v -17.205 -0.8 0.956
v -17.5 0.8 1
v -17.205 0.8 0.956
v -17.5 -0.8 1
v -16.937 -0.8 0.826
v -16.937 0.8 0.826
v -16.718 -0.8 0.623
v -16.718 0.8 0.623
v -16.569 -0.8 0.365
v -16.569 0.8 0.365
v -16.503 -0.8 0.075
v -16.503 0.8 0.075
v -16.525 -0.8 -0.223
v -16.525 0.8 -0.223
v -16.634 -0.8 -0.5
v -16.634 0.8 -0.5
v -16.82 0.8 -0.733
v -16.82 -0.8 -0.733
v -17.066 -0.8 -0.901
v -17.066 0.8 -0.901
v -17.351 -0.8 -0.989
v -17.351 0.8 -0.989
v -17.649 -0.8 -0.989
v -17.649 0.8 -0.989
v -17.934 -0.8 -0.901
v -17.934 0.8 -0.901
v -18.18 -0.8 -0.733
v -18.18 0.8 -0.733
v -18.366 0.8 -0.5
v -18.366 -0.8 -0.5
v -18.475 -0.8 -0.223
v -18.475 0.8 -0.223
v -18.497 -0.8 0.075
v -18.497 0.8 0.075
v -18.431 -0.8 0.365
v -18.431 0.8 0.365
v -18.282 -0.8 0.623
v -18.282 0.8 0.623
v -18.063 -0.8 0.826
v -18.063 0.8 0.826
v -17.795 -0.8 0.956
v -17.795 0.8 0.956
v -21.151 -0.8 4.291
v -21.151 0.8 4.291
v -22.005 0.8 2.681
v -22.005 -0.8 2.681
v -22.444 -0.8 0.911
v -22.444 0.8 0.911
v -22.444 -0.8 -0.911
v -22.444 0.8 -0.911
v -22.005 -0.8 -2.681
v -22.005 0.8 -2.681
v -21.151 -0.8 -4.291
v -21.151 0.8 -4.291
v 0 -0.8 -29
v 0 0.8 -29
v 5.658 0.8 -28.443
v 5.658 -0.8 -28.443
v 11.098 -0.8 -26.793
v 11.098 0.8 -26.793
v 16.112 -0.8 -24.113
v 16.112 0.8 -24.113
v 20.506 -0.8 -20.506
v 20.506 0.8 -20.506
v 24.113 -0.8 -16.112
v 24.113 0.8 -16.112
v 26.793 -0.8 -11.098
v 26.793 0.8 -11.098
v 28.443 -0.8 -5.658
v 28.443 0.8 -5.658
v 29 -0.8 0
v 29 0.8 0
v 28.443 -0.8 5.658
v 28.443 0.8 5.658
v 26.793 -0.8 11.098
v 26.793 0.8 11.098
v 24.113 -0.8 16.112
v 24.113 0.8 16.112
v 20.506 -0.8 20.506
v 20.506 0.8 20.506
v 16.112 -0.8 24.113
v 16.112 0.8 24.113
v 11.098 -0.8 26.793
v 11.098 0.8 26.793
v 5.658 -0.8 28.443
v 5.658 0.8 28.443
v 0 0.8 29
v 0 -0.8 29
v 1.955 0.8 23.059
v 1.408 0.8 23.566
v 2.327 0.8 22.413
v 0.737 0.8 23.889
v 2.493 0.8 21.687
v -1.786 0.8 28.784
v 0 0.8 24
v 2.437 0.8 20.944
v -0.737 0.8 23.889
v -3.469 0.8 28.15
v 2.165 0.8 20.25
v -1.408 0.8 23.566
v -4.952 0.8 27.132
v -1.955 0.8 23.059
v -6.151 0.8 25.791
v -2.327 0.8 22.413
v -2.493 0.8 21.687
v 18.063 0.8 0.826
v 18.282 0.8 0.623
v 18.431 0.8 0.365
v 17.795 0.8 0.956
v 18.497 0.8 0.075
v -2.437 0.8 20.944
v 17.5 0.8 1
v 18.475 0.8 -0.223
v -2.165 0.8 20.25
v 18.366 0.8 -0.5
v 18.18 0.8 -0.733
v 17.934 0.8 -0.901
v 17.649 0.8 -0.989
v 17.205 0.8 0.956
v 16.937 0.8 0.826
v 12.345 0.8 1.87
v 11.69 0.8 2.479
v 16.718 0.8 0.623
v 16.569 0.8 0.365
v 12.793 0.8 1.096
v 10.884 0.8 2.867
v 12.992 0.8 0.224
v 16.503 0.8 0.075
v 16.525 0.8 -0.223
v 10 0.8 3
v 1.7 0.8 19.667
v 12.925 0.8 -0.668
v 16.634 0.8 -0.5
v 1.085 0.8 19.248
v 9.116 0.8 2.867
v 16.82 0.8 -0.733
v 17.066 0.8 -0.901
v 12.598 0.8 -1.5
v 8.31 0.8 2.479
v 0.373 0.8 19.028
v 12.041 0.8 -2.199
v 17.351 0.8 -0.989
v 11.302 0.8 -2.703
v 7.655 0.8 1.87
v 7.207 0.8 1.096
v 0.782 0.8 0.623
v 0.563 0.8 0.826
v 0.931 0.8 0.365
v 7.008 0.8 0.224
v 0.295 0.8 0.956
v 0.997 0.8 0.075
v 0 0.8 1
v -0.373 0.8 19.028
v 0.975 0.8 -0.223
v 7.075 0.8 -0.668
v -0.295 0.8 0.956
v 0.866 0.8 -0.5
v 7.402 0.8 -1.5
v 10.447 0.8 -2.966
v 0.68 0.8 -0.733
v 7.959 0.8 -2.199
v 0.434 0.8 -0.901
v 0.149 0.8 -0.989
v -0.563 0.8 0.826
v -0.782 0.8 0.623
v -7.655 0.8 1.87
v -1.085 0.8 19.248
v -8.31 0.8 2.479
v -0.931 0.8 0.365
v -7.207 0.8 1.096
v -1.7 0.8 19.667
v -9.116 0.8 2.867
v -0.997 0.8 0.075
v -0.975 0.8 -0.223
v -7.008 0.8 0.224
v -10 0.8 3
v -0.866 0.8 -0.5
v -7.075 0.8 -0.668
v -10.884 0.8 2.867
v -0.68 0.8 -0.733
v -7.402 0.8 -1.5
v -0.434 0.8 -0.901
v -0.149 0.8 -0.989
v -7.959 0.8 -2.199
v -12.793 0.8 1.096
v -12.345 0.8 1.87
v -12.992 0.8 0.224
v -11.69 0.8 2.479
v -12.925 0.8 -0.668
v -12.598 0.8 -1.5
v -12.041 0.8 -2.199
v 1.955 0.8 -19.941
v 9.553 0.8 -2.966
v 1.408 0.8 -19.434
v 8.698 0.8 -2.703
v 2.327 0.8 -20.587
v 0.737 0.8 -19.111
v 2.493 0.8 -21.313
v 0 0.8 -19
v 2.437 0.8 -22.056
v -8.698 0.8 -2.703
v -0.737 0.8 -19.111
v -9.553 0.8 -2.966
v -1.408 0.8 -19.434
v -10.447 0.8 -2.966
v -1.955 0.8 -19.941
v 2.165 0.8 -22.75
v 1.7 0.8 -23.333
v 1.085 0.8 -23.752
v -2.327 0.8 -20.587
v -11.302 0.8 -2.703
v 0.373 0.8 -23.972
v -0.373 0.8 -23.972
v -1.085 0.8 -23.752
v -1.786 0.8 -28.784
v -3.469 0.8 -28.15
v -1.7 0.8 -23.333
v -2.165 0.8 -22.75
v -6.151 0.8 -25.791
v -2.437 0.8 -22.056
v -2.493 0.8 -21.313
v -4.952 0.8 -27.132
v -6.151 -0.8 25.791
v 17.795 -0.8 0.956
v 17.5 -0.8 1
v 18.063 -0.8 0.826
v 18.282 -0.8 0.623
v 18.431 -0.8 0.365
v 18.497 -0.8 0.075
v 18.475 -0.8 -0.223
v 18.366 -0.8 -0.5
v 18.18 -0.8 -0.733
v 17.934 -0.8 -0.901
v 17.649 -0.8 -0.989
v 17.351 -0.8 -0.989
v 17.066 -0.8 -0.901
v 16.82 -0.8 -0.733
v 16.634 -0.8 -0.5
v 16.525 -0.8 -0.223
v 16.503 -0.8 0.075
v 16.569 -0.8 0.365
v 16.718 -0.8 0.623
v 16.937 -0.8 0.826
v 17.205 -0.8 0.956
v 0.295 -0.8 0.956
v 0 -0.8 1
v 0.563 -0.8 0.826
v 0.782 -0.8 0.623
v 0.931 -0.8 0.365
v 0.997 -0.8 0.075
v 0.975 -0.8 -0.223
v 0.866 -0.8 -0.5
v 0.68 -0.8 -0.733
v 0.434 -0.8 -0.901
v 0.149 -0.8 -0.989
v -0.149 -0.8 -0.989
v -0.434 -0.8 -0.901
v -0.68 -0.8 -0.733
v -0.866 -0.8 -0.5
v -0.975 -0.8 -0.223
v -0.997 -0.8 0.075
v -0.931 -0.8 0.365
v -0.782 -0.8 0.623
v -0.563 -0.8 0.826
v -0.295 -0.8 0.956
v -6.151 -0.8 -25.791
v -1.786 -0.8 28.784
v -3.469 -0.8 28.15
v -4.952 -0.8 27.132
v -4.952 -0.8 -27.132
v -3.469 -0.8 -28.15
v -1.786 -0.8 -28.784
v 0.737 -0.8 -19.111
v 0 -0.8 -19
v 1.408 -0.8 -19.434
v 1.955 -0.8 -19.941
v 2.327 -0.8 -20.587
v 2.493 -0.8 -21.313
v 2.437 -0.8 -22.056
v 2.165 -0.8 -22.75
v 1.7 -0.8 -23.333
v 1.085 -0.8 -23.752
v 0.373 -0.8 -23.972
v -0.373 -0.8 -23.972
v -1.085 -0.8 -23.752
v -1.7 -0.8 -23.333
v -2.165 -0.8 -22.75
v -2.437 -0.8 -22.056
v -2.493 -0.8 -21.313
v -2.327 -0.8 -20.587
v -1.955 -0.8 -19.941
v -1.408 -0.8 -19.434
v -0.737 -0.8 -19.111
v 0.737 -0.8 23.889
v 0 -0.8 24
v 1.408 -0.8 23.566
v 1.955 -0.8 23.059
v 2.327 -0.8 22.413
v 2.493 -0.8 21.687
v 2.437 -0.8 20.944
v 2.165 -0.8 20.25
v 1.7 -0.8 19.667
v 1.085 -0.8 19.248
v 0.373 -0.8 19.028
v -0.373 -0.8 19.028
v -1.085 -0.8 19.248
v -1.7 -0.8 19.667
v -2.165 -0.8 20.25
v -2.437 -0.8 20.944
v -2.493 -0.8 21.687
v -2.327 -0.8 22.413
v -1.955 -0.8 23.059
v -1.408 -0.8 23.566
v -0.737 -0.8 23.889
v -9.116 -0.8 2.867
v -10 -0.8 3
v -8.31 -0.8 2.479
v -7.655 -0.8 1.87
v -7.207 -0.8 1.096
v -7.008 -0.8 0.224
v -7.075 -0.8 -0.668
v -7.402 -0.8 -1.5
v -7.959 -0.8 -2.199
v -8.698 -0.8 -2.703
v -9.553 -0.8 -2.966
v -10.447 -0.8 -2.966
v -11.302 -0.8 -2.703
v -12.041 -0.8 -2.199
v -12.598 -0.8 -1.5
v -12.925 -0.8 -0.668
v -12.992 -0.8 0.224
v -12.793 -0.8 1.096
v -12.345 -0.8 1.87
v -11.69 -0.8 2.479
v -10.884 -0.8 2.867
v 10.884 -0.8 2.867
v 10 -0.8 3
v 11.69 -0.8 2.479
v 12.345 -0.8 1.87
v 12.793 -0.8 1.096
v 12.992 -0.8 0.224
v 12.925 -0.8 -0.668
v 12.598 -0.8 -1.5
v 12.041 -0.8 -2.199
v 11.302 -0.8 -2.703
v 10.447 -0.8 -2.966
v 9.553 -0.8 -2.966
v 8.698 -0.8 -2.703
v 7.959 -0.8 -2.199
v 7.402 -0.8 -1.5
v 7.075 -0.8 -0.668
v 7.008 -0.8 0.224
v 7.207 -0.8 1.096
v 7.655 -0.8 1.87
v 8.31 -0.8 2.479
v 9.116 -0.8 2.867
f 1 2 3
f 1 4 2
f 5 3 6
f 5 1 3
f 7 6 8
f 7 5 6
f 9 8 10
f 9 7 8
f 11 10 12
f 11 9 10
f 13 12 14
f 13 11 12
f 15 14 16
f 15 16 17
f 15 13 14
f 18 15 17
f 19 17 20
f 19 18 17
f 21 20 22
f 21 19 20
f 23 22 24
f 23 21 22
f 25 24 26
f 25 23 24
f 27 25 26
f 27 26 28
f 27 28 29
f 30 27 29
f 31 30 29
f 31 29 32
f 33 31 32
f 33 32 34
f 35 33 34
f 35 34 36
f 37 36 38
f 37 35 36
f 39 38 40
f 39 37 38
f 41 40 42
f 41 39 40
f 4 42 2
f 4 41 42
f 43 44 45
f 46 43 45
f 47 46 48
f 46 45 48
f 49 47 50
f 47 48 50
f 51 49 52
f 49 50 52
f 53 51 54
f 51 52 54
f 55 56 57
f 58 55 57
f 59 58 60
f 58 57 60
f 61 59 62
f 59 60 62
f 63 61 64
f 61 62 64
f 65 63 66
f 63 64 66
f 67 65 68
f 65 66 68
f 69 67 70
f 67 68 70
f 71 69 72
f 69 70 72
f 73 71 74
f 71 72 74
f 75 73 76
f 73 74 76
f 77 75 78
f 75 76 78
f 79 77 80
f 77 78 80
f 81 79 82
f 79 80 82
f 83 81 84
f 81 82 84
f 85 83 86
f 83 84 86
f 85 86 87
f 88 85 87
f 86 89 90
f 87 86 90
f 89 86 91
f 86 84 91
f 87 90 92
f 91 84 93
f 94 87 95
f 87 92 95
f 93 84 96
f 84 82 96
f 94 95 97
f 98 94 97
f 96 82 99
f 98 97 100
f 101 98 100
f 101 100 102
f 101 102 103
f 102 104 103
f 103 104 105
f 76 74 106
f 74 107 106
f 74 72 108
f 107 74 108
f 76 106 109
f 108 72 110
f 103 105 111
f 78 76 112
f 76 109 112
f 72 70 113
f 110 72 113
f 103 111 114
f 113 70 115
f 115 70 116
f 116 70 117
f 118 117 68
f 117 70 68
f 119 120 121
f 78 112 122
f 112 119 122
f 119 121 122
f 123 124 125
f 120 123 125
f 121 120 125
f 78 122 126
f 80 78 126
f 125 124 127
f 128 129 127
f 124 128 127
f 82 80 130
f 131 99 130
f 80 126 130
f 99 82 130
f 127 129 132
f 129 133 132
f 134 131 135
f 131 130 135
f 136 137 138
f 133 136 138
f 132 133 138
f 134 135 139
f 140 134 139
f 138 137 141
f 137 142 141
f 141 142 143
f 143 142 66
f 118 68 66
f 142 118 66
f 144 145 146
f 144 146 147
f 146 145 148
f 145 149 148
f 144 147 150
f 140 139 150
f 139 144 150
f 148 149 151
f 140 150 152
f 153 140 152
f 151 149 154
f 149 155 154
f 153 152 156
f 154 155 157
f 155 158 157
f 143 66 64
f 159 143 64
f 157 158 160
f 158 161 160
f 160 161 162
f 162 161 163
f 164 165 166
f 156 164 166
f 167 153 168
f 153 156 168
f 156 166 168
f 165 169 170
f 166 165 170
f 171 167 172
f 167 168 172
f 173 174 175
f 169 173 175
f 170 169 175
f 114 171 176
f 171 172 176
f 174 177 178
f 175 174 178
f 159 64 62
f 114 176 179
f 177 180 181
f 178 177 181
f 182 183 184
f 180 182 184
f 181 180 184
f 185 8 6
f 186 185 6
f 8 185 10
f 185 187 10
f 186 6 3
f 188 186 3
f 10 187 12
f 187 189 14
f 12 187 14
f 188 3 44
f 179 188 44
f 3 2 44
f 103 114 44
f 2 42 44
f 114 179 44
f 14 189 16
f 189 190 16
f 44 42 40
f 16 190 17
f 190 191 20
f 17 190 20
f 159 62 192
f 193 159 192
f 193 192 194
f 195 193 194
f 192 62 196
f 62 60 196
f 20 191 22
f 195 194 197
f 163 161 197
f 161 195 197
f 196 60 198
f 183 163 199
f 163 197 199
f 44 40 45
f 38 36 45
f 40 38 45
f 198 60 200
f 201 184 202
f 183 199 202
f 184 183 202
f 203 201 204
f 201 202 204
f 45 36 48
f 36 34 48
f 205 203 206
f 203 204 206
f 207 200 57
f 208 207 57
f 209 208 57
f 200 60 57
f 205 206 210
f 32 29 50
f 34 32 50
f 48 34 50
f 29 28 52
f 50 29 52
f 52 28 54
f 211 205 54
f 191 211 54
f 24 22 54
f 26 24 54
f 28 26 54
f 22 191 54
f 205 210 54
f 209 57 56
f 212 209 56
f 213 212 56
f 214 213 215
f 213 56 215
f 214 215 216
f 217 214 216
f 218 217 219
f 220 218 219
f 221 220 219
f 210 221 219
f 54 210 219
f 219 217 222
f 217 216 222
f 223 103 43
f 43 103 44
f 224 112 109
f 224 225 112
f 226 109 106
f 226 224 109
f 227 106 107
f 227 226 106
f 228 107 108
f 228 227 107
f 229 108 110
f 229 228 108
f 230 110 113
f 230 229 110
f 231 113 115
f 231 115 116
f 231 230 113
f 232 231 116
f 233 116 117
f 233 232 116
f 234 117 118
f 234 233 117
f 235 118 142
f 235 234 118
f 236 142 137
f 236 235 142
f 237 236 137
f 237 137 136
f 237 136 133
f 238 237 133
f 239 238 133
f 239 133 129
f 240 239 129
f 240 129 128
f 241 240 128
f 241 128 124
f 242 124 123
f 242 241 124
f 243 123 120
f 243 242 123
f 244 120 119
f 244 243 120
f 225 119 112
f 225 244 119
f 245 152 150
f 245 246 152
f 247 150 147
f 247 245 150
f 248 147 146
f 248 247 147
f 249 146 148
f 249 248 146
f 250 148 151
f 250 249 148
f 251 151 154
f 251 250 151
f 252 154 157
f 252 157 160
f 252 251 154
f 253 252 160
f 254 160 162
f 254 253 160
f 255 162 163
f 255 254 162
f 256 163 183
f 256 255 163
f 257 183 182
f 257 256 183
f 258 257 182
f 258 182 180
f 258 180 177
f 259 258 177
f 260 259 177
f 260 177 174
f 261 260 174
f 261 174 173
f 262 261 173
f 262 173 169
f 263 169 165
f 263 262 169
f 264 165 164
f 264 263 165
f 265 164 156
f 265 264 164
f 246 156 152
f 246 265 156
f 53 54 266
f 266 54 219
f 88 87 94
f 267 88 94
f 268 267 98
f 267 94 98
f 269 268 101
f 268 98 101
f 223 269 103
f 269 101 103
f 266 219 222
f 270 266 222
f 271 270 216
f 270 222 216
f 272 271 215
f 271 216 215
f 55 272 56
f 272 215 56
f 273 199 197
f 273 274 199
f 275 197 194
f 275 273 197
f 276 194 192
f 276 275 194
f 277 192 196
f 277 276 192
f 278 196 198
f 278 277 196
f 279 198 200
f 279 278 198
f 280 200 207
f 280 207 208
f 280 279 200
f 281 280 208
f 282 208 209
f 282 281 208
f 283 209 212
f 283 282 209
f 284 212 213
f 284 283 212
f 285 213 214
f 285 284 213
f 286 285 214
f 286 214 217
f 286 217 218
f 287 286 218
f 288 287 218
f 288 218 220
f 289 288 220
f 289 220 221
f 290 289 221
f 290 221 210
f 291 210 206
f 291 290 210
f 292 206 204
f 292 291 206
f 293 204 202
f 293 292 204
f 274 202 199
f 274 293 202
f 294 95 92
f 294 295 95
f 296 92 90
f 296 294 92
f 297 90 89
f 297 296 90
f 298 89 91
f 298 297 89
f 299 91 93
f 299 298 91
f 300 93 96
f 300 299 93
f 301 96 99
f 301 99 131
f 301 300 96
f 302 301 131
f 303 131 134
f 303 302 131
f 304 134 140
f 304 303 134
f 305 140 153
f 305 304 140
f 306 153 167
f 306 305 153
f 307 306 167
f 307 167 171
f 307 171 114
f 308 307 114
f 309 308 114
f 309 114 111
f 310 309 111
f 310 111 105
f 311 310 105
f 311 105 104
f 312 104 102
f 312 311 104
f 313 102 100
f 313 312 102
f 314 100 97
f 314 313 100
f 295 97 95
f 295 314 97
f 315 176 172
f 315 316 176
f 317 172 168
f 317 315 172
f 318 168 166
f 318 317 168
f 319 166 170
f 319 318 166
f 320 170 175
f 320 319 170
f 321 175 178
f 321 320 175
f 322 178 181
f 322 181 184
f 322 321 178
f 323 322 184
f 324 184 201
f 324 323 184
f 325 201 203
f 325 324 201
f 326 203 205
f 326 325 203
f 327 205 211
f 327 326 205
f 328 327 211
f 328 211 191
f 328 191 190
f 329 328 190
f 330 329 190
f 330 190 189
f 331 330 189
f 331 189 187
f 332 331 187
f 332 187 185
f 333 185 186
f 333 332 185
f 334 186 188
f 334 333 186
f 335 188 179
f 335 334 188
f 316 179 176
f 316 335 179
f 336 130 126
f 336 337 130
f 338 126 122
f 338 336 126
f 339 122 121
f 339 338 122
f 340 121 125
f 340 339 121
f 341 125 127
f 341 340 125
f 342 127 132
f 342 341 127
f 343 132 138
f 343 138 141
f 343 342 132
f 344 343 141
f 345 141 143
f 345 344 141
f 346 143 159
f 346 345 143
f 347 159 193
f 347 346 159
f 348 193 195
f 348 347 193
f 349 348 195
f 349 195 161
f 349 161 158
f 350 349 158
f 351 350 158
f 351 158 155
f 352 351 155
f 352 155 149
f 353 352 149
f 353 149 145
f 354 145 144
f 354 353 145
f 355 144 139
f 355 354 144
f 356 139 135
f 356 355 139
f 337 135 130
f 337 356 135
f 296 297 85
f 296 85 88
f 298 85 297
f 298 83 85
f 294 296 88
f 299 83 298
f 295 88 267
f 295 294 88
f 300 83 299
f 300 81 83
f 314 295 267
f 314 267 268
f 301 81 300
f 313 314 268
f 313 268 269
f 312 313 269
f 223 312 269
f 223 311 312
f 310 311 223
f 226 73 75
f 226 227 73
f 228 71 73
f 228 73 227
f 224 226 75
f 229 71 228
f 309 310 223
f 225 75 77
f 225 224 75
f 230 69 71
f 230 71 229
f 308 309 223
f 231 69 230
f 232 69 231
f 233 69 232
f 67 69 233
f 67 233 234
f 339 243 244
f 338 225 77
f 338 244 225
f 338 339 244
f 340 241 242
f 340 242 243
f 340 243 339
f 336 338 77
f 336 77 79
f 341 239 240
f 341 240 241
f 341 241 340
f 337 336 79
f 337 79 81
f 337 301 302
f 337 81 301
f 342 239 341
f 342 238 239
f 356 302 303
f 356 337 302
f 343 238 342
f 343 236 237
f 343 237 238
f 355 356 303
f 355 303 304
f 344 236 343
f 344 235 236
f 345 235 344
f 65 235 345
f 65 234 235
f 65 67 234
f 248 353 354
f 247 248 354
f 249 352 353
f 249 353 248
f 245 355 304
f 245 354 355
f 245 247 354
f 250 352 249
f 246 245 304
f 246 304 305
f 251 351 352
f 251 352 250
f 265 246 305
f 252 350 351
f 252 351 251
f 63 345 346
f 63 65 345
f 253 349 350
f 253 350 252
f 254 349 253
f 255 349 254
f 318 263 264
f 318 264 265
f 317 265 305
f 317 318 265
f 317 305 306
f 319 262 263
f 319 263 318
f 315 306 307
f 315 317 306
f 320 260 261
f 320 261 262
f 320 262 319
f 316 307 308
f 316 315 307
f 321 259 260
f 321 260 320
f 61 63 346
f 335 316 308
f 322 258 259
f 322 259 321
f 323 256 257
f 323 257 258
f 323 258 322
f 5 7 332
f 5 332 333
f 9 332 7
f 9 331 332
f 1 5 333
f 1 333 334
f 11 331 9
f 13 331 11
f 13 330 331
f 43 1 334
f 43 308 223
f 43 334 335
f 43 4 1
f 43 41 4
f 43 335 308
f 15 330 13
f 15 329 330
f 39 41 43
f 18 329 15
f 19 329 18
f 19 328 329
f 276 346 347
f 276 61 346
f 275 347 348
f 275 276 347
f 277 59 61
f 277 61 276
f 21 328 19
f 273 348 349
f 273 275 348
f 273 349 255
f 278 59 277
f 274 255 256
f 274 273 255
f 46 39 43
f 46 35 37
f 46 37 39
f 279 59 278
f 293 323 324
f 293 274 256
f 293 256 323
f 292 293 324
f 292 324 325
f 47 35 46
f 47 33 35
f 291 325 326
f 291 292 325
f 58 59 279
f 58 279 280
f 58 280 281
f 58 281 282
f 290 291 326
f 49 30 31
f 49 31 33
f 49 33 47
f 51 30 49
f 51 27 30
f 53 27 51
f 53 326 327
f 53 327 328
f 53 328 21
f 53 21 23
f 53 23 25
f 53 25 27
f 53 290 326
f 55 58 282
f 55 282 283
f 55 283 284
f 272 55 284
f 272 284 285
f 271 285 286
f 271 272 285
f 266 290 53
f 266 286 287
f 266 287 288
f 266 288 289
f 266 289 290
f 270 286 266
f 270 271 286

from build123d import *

# Parameters (mm, degrees)
SKETCH1_R           = 2.5
SKETCH1_R_2         = 3
SKETCH1_R_3         = 1
BOSS_EXTRUDE1_DEPTH = 0.8
BOSS_EXTRUDE2_DEPTH = 1.6


with BuildPart() as part:
    # Sketch1 → Boss-Extrude1 (new, symmetric)
    with BuildSketch(Plane(origin=(0, 0, 0), x_dir=(1, 0, 0), z_dir=(0, 1, 0))):
        with BuildLine():
            Line((-21.150952157, 4.29136197), (-6.150952157, 25.79136197))
            ThreePointArc((-6.150952157, 25.79136197), (0, 29), (6.150952157, 25.79136197))
            Line((6.150952157, 25.79136197), (21.150952157, 4.29136197))
            ThreePointArc((21.150952157, 4.29136197), (22.5, 0), (21.150952157, -4.29136197))
            Line((21.150952157, -4.29136197), (6.150952157, -25.79136197))
            ThreePointArc((6.150952157, -25.79136197), (0, -29), (-6.150952157, -25.79136197))
            Line((-6.150952157, -25.79136197), (-21.150952157, -4.29136197))
            ThreePointArc((-21.150952157, -4.29136197), (-22.5, 0), (-21.150952157, 4.29136197))
        make_face()
        with Locations(Location((0, 21.5, 0), (0, 0, 270))):
            Circle(SKETCH1_R, mode=Mode.SUBTRACT)
        with Locations(Location((0, -21.5, 0), (0, 0, 270))):
            Circle(SKETCH1_R, mode=Mode.SUBTRACT)
        with Locations(Location((-10, 0, 0), (0, 0, 270))):
            Circle(SKETCH1_R_2, mode=Mode.SUBTRACT)
        with Locations(Location((10, 0, 0), (0, 0, 270))):
            Circle(SKETCH1_R_2, mode=Mode.SUBTRACT)
        with Locations(Location((-17.5, 0, 0), (0, 0, 270))):
            Circle(SKETCH1_R_3, mode=Mode.SUBTRACT)
        with Locations(Location((0, 0, 0), (0, 0, 270))):
            Circle(SKETCH1_R_3, mode=Mode.SUBTRACT)
        with Locations(Location((17.5, 0, 0), (0, 0, 270))):
            Circle(SKETCH1_R_3, mode=Mode.SUBTRACT)
    extrude(amount=BOSS_EXTRUDE1_DEPTH, both=True)

    # Sketch2 → Boss-Extrude2 (add, through all)
    with BuildSketch(Plane(origin=(0, 0.8, 0), x_dir=(1, 0, 0), z_dir=(0, 1, 0))):
        with BuildLine():
            Line((0, -29), (22.5, 0))
            Line((22.5, 0), (0, 29))
            ThreePointArc((0, 29), (29, 0), (0, -29))
        make_face()
    extrude(amount=-BOSS_EXTRUDE2_DEPTH)


solid = part.part
